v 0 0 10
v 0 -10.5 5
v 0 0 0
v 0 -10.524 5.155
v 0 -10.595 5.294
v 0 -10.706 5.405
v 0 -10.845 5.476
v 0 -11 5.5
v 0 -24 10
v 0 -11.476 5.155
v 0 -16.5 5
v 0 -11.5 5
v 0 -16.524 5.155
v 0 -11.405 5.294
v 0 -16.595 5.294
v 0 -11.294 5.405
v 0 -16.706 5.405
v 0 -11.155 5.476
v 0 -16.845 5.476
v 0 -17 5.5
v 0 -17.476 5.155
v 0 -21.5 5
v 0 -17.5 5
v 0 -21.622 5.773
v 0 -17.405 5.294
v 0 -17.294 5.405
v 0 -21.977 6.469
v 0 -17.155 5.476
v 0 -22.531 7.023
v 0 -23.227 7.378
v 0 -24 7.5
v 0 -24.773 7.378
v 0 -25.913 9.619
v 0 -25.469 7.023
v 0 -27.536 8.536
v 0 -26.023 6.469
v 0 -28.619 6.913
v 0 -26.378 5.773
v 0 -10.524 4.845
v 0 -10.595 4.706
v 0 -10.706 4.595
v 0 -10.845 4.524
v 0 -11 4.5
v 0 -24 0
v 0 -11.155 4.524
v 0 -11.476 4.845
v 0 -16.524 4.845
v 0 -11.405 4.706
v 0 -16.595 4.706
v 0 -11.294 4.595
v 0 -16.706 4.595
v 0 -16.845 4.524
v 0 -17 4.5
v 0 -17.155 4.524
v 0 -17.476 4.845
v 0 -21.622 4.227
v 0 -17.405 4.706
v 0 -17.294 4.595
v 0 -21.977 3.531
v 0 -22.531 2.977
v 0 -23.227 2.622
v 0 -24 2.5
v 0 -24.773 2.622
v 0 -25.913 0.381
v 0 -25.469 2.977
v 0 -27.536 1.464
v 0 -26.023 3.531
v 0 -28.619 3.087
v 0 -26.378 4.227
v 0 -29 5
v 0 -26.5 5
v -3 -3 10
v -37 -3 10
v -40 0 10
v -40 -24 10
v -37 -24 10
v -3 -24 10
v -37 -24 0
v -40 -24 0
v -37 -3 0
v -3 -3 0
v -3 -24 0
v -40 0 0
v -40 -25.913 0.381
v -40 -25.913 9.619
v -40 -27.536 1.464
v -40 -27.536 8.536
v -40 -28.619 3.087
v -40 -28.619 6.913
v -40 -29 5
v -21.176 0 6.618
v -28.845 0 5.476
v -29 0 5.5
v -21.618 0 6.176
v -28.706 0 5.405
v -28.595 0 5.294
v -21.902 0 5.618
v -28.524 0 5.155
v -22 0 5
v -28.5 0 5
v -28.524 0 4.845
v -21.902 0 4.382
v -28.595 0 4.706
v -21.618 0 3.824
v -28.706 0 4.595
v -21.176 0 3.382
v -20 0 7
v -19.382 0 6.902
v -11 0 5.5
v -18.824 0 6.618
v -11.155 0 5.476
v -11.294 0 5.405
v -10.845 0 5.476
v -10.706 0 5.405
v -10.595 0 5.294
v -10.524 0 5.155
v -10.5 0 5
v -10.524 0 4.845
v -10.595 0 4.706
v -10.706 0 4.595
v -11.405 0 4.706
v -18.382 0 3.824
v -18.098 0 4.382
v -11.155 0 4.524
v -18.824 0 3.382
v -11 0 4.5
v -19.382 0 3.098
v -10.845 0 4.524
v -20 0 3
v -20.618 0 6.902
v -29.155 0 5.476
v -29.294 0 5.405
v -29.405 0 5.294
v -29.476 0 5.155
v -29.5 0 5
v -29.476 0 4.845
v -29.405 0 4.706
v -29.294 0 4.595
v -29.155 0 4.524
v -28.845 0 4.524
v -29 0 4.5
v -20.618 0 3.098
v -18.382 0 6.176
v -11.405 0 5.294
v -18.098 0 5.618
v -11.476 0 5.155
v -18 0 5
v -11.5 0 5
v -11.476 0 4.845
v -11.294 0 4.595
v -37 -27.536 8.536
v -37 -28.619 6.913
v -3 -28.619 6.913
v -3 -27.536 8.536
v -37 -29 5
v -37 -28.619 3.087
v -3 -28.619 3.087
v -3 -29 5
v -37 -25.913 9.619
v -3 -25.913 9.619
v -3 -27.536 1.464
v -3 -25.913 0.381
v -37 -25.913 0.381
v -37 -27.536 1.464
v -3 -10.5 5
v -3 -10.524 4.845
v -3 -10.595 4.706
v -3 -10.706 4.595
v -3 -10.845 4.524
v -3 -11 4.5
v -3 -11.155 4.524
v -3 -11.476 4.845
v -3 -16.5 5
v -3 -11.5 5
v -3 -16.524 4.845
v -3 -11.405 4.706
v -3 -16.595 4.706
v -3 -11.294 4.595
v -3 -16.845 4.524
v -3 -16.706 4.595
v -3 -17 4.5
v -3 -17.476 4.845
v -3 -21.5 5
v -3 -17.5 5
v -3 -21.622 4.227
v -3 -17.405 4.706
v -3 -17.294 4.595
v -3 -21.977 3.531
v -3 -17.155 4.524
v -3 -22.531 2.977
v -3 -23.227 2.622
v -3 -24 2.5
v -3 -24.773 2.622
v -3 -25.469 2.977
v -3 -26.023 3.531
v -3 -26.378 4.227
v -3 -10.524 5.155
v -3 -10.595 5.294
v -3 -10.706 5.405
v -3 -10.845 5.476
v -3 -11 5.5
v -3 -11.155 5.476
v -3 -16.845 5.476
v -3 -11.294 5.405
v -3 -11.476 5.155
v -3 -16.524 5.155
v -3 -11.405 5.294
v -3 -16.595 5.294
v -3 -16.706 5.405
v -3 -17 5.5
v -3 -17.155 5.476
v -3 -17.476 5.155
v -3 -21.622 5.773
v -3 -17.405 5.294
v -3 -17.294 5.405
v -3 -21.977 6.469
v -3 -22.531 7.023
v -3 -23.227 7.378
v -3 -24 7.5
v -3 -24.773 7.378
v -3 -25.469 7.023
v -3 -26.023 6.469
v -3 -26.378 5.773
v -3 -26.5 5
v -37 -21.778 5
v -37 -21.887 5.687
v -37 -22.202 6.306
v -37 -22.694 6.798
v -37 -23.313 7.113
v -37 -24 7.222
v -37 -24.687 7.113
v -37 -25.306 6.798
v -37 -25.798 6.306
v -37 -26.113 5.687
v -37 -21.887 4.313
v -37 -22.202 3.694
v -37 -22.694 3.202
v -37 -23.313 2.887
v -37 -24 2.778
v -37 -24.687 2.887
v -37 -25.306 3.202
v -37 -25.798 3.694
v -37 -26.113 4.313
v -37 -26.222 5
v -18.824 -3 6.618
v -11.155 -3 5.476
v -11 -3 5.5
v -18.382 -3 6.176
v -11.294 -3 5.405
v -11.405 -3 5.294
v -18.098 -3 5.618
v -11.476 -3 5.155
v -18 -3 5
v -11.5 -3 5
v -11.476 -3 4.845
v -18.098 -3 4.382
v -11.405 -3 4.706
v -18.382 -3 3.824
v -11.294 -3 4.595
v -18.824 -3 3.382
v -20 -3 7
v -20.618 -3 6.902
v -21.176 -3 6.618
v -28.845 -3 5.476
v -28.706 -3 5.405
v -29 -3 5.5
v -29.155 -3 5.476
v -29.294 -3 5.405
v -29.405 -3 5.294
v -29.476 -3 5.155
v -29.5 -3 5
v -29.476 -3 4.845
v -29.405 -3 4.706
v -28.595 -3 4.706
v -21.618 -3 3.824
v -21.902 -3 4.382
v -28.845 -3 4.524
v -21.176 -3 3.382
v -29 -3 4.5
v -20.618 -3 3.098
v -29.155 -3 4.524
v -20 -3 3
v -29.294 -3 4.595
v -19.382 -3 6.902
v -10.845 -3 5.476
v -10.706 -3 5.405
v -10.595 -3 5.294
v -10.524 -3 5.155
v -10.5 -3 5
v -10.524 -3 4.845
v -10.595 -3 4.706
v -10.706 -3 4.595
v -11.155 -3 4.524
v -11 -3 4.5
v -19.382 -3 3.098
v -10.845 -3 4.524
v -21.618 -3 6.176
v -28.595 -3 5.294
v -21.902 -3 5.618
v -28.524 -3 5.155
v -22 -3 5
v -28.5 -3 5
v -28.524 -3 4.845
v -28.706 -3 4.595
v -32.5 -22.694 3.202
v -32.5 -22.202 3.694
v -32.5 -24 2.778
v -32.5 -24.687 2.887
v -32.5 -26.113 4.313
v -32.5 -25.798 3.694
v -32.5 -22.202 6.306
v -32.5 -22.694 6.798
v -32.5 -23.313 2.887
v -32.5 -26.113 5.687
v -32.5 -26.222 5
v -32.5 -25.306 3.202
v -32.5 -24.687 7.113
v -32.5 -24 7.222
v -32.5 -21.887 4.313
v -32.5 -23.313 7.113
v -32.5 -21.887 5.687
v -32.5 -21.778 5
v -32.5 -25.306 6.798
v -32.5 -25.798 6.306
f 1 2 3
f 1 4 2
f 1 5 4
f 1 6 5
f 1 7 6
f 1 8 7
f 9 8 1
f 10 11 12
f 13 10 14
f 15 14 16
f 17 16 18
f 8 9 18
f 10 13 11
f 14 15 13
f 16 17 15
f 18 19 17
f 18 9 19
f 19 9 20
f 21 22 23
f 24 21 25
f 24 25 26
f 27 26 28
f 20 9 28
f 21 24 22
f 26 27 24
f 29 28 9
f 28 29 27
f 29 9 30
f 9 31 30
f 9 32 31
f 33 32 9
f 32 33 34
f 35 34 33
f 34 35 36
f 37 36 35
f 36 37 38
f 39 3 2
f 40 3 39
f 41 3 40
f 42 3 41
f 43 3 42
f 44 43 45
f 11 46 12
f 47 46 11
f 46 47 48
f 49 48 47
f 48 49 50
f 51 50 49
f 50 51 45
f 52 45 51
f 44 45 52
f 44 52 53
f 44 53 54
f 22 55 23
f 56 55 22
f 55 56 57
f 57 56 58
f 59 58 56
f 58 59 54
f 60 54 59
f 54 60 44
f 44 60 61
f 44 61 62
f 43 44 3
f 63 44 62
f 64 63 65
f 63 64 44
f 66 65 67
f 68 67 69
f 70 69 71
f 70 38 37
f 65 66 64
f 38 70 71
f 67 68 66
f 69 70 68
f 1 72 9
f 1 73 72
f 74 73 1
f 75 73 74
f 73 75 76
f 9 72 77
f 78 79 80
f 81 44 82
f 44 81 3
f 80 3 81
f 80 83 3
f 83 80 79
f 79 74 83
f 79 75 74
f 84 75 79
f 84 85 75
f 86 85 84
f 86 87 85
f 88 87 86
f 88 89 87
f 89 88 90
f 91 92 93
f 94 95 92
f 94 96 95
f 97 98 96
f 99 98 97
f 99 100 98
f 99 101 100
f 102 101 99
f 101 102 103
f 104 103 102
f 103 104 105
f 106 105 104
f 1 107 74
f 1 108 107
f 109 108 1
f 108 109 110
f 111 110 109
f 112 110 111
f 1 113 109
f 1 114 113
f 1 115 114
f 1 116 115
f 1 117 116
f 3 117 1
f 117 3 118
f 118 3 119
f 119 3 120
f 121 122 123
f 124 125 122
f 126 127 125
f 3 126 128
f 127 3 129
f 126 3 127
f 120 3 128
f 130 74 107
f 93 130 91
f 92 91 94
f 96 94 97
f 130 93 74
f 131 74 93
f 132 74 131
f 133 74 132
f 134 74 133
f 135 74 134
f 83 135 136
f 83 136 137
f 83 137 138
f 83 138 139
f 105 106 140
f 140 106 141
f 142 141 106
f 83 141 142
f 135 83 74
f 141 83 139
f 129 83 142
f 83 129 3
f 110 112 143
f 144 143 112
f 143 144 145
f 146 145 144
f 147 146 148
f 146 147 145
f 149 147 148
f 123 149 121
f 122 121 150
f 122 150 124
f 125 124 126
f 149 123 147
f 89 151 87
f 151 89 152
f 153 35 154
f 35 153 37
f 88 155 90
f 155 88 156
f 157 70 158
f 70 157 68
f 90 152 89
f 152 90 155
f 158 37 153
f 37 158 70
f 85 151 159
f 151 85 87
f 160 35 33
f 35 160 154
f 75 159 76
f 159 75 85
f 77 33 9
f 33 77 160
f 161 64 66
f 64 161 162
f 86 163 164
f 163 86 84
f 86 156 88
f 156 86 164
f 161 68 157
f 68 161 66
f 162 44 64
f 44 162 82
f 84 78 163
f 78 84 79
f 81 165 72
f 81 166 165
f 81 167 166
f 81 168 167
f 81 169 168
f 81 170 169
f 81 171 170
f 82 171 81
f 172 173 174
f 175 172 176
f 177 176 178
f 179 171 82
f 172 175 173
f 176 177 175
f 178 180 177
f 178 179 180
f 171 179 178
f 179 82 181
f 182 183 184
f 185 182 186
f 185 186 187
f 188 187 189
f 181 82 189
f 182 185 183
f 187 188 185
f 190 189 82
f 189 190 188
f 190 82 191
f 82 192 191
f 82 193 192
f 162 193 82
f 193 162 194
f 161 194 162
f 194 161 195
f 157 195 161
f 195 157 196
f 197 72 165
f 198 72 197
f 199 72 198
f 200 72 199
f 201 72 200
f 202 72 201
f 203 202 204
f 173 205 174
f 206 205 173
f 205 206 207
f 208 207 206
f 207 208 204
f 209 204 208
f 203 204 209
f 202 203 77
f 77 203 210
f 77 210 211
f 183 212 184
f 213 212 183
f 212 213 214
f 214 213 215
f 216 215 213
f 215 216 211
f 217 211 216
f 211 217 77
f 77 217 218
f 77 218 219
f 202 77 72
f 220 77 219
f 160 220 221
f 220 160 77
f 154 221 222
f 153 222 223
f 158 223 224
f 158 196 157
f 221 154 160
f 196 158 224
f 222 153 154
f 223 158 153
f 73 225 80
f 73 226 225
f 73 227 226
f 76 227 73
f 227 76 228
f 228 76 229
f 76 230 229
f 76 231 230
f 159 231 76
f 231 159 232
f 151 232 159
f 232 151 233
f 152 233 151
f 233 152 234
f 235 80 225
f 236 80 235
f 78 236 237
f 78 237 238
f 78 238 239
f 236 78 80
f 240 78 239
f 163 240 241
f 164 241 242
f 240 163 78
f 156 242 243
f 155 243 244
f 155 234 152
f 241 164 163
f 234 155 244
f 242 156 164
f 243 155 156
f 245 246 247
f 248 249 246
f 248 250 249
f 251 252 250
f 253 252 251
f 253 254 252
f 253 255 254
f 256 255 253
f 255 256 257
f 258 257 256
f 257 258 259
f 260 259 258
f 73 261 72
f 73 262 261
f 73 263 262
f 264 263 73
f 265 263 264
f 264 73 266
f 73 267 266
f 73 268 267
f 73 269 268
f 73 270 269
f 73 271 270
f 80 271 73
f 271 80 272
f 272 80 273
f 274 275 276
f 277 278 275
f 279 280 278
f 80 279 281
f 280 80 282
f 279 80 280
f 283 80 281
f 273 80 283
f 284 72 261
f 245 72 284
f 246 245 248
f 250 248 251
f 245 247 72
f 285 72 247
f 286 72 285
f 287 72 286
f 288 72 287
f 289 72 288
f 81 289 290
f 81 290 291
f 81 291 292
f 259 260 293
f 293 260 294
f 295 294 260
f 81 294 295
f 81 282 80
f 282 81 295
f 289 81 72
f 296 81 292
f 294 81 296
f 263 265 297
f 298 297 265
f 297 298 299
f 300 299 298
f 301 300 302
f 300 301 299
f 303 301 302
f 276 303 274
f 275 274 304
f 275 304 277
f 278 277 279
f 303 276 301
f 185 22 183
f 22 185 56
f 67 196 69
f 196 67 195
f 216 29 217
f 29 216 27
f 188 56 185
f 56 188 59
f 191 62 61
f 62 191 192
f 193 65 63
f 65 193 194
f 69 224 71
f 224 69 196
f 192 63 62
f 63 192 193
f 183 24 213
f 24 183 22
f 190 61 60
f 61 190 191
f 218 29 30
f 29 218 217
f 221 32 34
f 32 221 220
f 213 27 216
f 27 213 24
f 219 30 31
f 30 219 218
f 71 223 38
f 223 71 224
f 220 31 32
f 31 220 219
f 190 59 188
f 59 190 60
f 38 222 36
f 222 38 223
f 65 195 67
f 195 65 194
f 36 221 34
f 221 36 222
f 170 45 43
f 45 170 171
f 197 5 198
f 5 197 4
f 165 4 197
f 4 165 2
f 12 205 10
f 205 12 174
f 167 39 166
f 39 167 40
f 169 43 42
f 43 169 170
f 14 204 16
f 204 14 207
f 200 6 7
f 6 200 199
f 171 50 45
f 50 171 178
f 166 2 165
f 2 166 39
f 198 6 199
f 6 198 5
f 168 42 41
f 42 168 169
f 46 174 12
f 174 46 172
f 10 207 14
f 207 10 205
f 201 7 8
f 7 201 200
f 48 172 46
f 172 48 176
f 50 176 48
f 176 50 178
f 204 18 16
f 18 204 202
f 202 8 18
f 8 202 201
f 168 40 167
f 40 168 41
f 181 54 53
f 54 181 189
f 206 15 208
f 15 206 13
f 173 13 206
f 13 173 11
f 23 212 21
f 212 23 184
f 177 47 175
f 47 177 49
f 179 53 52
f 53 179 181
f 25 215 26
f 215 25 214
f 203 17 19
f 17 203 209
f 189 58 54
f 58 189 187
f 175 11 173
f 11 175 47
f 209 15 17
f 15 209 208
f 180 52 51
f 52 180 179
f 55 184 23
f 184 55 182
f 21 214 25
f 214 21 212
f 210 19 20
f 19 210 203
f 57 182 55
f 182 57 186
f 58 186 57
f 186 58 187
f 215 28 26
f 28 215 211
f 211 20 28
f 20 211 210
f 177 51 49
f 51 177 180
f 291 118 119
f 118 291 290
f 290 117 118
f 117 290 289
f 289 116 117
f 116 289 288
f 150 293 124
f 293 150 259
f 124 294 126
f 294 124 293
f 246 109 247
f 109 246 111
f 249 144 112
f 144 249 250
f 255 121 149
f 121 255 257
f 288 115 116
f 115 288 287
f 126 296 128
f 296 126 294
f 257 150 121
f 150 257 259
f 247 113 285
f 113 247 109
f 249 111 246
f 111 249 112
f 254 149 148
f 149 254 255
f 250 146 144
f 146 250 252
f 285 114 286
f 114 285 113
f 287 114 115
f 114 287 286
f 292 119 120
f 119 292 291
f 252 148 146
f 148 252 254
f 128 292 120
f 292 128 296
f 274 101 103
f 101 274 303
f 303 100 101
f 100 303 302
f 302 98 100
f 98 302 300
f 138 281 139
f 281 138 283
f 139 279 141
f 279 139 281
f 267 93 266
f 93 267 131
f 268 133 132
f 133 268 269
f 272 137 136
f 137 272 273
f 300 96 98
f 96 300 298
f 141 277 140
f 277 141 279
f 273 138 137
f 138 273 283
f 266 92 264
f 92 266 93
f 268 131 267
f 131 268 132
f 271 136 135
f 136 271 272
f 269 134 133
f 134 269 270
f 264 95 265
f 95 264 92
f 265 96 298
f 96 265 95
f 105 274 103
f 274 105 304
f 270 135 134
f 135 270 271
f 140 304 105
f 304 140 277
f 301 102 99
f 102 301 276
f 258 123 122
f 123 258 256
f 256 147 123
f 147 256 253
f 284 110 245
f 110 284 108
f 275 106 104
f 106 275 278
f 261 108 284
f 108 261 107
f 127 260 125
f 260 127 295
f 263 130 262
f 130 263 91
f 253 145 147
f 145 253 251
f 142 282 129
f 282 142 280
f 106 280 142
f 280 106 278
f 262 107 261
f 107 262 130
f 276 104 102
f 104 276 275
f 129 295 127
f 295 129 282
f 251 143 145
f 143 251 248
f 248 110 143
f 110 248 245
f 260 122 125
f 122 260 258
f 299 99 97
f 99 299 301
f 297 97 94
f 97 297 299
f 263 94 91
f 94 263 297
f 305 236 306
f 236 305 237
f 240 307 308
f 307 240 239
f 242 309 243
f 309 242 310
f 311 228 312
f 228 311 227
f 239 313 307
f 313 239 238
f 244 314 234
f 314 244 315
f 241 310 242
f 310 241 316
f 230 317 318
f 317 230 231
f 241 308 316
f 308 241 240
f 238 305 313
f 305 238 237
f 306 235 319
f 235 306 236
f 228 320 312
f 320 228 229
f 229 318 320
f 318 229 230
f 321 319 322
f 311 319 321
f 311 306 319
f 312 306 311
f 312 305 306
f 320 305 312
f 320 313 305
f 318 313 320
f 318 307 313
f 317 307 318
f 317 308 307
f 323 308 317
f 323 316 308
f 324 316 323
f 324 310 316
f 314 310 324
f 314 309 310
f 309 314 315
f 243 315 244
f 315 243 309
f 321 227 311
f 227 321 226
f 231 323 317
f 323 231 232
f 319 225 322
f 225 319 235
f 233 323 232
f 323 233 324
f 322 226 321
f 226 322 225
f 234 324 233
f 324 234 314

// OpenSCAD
mainbox = [40,24,10];
inbox = [34, 70, 60];

union(){
    difference(){
       union(){
           translate([-mainbox[0],-mainbox[1],0])
             cube(mainbox);
           
           translate([0,-mainbox[1],mainbox[2]/2])
           rotate([0,-90,0])
           cylinder(h=mainbox[0],r=mainbox[2]/2);
           
           
                
       }
       union(){
           translate([-inbox[0]-3,-inbox[1]-3,-1])
            cube([inbox[0],inbox[1],inbox[2]]);
           
           translate([-5,-mainbox[1],mainbox[2]/2])
           rotate([0,90,0])
           cylinder(h=7.5,r=mainbox[2]/4,$fn=20);
           
           translate([-5,-11,mainbox[2]/2])
           rotate([0,90,0])
           cylinder(h=7.5,r=.5,$fn=20);
           
           translate([-5,-17,mainbox[2]/2])
           rotate([0,90,0])
           cylinder(h=7.5,r=.5,$fn=20);
           
           translate([-11,-5,mainbox[2]/2])
           rotate([-90,0,0])
           cylinder(h=7.5,r=.5,$fn=20);
           
           translate([-29,-5,mainbox[2]/2])
           rotate([-90,0,0])
           cylinder(h=7.5,r=.5,$fn=20);
           
           translate([-20,-5,mainbox[2]/2])
           rotate([-90,0,0])
           cylinder(h=7.5,r=2,$fn=20);
            
       } 
    }
    translate([-mainbox[0],-mainbox[1],mainbox[2]/2])
       rotate([0,90,0])
       cylinder(h=7.5,r=mainbox[2]/4.5,$fn=20);
}
    
